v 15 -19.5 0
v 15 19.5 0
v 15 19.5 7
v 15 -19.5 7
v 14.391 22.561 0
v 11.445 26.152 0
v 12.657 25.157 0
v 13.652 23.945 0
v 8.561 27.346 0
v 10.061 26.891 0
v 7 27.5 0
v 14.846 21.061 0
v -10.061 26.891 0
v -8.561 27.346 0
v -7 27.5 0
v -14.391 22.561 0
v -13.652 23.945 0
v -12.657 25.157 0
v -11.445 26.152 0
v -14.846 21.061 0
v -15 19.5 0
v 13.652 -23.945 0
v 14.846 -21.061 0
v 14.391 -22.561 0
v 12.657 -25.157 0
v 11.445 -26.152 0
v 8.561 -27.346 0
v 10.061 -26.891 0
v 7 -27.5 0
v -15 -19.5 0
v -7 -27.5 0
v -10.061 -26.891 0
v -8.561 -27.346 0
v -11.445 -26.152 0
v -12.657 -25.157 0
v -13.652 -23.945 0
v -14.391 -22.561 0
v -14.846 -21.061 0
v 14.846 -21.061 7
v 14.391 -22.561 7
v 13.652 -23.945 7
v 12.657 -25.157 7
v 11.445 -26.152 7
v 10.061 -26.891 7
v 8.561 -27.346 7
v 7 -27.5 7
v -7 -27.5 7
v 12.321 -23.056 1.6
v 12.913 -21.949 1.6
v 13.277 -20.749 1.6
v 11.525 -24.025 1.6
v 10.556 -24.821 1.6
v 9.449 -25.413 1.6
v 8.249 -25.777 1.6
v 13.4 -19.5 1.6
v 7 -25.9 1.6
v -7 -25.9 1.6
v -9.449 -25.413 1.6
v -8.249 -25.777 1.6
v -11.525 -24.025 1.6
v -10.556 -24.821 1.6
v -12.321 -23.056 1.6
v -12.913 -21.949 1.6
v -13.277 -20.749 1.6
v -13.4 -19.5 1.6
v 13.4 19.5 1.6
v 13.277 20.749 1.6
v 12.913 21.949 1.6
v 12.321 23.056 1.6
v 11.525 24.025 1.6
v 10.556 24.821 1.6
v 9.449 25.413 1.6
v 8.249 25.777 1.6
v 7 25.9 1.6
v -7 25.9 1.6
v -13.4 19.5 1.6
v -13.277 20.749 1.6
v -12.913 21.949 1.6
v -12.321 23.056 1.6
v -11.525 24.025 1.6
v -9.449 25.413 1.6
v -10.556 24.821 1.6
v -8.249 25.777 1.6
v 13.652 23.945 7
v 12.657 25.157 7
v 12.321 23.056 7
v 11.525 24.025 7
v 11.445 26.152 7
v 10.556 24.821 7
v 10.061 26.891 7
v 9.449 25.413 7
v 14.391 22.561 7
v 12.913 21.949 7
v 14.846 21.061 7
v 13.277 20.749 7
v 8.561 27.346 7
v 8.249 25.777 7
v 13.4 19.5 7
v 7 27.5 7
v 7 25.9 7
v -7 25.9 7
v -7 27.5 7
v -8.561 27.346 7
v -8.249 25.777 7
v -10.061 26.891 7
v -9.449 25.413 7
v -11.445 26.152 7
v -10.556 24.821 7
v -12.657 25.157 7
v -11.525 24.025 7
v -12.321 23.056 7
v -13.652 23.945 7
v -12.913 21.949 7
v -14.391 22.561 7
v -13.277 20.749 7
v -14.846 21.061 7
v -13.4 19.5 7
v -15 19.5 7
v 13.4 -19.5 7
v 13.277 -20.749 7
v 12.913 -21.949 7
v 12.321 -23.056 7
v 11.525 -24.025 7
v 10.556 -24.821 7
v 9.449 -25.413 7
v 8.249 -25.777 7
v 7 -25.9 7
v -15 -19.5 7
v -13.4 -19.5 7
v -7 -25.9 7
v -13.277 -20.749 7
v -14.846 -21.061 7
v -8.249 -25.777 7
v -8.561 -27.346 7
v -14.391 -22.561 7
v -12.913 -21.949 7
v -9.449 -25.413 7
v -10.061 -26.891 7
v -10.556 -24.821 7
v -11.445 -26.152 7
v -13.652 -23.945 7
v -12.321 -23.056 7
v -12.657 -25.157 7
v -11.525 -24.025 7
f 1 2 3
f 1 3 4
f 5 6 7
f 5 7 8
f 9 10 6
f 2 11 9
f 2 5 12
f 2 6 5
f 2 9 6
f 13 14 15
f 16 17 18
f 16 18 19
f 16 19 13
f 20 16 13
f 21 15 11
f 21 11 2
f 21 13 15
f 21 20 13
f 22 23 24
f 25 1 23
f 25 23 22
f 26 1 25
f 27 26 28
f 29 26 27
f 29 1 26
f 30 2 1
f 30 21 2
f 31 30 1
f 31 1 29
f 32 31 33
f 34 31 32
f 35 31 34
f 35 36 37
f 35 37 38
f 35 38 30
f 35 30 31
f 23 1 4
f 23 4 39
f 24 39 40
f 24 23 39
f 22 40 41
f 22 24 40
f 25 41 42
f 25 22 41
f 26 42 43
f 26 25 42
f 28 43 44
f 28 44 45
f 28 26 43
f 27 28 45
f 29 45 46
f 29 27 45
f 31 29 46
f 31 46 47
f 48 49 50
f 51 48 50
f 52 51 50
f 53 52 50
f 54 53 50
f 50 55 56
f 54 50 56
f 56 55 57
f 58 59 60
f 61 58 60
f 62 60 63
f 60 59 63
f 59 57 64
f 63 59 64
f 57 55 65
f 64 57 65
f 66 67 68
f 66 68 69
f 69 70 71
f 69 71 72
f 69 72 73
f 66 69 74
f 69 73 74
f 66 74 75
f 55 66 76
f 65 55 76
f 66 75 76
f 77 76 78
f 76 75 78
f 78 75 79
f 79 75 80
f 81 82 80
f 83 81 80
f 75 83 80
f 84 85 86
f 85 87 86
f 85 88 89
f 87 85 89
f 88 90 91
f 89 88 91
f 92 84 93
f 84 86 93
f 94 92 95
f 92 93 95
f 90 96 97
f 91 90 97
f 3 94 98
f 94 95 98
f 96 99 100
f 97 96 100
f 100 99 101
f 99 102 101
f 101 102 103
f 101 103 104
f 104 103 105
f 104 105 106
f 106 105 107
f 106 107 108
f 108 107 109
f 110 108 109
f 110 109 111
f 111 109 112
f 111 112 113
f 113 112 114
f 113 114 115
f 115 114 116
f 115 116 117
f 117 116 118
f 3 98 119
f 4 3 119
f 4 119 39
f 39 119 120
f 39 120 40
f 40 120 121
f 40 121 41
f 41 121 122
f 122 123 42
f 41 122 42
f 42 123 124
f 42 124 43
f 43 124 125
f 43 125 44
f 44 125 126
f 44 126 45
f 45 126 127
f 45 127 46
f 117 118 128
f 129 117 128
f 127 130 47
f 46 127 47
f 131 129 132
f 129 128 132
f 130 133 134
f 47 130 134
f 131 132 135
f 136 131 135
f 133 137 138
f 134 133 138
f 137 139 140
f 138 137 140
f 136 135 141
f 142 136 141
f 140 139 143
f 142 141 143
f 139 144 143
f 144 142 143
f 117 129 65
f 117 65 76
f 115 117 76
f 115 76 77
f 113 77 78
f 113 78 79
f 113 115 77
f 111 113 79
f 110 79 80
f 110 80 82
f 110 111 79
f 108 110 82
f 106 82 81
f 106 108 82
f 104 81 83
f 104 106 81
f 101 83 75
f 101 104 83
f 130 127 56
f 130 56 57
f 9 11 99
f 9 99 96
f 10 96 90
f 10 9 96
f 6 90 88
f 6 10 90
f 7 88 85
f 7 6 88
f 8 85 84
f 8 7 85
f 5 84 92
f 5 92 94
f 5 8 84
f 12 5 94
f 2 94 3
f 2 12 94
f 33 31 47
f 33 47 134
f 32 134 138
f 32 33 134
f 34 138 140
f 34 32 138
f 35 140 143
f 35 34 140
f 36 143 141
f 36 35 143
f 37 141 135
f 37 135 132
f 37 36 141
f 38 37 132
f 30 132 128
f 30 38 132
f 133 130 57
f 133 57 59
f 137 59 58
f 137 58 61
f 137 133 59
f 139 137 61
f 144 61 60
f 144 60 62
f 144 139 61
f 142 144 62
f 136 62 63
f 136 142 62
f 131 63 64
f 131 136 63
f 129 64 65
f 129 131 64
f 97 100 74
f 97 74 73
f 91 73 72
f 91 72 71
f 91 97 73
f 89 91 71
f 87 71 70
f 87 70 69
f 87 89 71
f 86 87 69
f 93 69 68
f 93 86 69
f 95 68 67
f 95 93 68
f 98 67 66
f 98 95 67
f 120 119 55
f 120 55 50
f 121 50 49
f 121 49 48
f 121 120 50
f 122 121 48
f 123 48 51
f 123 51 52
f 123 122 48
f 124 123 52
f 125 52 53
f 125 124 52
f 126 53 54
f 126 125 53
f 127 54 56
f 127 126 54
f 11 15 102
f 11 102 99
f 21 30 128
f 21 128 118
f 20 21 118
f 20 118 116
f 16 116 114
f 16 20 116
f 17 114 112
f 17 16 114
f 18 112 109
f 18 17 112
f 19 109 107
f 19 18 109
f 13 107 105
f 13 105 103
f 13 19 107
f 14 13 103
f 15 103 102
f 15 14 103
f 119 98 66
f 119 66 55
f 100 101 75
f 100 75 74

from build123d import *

# Parameters (mm, degrees)
BOSS_EXTRUDE1_DEPTH = 7
CUT_EXTRUDE1_DEPTH  = 5.4


with BuildPart() as part:
    # Sketch1 → Boss-Extrude1 (new body)
    with BuildSketch(Plane(origin=(0, 0, 0), x_dir=(0, 1, 0), z_dir=(0, 0, 1))):
        with BuildLine():
            Line((-19.5, 15), (19.5, 15))
            ThreePointArc((19.5, 15), (25.156854249, 12.656854249), (27.5, 7))
            Line((27.5, 7), (27.5, -7))
            ThreePointArc((27.5, -7), (25.156854249, -12.656854249), (19.5, -15))
            Line((19.5, -15), (-19.5, -15))
            ThreePointArc((-19.5, -15), (-25.156854249, -12.656854249), (-27.5, -7))
            Line((-27.5, -7), (-27.5, 7))
            ThreePointArc((-27.5, 7), (-25.156854249, 12.656854249), (-19.5, 15))
        make_face()
    extrude(amount=BOSS_EXTRUDE1_DEPTH)

    # Sketch2 → Cut-Extrude1 (cut)
    with BuildSketch(Plane.XY.offset(7)):
        with BuildLine():
            Line((7, -25.9), (-7, -25.9))
            ThreePointArc((-7, -25.9), (-11.5254834, -24.0254834), (-13.4, -19.5))
            Line((-13.4, -19.5), (-13.4, 19.5))
            ThreePointArc((-13.4, 19.5), (-11.5254834, 24.0254834), (-7, 25.9))
            Line((-7, 25.9), (7, 25.9))
            ThreePointArc((7, 25.9), (11.5254834, 24.0254834), (13.4, 19.5))
            Line((13.4, 19.5), (13.4, -19.5))
            ThreePointArc((13.4, -19.5), (11.5254834, -24.0254834), (7, -25.9))
        make_face()
    extrude(amount=-CUT_EXTRUDE1_DEPTH, mode=Mode.SUBTRACT)


solid = part.part
